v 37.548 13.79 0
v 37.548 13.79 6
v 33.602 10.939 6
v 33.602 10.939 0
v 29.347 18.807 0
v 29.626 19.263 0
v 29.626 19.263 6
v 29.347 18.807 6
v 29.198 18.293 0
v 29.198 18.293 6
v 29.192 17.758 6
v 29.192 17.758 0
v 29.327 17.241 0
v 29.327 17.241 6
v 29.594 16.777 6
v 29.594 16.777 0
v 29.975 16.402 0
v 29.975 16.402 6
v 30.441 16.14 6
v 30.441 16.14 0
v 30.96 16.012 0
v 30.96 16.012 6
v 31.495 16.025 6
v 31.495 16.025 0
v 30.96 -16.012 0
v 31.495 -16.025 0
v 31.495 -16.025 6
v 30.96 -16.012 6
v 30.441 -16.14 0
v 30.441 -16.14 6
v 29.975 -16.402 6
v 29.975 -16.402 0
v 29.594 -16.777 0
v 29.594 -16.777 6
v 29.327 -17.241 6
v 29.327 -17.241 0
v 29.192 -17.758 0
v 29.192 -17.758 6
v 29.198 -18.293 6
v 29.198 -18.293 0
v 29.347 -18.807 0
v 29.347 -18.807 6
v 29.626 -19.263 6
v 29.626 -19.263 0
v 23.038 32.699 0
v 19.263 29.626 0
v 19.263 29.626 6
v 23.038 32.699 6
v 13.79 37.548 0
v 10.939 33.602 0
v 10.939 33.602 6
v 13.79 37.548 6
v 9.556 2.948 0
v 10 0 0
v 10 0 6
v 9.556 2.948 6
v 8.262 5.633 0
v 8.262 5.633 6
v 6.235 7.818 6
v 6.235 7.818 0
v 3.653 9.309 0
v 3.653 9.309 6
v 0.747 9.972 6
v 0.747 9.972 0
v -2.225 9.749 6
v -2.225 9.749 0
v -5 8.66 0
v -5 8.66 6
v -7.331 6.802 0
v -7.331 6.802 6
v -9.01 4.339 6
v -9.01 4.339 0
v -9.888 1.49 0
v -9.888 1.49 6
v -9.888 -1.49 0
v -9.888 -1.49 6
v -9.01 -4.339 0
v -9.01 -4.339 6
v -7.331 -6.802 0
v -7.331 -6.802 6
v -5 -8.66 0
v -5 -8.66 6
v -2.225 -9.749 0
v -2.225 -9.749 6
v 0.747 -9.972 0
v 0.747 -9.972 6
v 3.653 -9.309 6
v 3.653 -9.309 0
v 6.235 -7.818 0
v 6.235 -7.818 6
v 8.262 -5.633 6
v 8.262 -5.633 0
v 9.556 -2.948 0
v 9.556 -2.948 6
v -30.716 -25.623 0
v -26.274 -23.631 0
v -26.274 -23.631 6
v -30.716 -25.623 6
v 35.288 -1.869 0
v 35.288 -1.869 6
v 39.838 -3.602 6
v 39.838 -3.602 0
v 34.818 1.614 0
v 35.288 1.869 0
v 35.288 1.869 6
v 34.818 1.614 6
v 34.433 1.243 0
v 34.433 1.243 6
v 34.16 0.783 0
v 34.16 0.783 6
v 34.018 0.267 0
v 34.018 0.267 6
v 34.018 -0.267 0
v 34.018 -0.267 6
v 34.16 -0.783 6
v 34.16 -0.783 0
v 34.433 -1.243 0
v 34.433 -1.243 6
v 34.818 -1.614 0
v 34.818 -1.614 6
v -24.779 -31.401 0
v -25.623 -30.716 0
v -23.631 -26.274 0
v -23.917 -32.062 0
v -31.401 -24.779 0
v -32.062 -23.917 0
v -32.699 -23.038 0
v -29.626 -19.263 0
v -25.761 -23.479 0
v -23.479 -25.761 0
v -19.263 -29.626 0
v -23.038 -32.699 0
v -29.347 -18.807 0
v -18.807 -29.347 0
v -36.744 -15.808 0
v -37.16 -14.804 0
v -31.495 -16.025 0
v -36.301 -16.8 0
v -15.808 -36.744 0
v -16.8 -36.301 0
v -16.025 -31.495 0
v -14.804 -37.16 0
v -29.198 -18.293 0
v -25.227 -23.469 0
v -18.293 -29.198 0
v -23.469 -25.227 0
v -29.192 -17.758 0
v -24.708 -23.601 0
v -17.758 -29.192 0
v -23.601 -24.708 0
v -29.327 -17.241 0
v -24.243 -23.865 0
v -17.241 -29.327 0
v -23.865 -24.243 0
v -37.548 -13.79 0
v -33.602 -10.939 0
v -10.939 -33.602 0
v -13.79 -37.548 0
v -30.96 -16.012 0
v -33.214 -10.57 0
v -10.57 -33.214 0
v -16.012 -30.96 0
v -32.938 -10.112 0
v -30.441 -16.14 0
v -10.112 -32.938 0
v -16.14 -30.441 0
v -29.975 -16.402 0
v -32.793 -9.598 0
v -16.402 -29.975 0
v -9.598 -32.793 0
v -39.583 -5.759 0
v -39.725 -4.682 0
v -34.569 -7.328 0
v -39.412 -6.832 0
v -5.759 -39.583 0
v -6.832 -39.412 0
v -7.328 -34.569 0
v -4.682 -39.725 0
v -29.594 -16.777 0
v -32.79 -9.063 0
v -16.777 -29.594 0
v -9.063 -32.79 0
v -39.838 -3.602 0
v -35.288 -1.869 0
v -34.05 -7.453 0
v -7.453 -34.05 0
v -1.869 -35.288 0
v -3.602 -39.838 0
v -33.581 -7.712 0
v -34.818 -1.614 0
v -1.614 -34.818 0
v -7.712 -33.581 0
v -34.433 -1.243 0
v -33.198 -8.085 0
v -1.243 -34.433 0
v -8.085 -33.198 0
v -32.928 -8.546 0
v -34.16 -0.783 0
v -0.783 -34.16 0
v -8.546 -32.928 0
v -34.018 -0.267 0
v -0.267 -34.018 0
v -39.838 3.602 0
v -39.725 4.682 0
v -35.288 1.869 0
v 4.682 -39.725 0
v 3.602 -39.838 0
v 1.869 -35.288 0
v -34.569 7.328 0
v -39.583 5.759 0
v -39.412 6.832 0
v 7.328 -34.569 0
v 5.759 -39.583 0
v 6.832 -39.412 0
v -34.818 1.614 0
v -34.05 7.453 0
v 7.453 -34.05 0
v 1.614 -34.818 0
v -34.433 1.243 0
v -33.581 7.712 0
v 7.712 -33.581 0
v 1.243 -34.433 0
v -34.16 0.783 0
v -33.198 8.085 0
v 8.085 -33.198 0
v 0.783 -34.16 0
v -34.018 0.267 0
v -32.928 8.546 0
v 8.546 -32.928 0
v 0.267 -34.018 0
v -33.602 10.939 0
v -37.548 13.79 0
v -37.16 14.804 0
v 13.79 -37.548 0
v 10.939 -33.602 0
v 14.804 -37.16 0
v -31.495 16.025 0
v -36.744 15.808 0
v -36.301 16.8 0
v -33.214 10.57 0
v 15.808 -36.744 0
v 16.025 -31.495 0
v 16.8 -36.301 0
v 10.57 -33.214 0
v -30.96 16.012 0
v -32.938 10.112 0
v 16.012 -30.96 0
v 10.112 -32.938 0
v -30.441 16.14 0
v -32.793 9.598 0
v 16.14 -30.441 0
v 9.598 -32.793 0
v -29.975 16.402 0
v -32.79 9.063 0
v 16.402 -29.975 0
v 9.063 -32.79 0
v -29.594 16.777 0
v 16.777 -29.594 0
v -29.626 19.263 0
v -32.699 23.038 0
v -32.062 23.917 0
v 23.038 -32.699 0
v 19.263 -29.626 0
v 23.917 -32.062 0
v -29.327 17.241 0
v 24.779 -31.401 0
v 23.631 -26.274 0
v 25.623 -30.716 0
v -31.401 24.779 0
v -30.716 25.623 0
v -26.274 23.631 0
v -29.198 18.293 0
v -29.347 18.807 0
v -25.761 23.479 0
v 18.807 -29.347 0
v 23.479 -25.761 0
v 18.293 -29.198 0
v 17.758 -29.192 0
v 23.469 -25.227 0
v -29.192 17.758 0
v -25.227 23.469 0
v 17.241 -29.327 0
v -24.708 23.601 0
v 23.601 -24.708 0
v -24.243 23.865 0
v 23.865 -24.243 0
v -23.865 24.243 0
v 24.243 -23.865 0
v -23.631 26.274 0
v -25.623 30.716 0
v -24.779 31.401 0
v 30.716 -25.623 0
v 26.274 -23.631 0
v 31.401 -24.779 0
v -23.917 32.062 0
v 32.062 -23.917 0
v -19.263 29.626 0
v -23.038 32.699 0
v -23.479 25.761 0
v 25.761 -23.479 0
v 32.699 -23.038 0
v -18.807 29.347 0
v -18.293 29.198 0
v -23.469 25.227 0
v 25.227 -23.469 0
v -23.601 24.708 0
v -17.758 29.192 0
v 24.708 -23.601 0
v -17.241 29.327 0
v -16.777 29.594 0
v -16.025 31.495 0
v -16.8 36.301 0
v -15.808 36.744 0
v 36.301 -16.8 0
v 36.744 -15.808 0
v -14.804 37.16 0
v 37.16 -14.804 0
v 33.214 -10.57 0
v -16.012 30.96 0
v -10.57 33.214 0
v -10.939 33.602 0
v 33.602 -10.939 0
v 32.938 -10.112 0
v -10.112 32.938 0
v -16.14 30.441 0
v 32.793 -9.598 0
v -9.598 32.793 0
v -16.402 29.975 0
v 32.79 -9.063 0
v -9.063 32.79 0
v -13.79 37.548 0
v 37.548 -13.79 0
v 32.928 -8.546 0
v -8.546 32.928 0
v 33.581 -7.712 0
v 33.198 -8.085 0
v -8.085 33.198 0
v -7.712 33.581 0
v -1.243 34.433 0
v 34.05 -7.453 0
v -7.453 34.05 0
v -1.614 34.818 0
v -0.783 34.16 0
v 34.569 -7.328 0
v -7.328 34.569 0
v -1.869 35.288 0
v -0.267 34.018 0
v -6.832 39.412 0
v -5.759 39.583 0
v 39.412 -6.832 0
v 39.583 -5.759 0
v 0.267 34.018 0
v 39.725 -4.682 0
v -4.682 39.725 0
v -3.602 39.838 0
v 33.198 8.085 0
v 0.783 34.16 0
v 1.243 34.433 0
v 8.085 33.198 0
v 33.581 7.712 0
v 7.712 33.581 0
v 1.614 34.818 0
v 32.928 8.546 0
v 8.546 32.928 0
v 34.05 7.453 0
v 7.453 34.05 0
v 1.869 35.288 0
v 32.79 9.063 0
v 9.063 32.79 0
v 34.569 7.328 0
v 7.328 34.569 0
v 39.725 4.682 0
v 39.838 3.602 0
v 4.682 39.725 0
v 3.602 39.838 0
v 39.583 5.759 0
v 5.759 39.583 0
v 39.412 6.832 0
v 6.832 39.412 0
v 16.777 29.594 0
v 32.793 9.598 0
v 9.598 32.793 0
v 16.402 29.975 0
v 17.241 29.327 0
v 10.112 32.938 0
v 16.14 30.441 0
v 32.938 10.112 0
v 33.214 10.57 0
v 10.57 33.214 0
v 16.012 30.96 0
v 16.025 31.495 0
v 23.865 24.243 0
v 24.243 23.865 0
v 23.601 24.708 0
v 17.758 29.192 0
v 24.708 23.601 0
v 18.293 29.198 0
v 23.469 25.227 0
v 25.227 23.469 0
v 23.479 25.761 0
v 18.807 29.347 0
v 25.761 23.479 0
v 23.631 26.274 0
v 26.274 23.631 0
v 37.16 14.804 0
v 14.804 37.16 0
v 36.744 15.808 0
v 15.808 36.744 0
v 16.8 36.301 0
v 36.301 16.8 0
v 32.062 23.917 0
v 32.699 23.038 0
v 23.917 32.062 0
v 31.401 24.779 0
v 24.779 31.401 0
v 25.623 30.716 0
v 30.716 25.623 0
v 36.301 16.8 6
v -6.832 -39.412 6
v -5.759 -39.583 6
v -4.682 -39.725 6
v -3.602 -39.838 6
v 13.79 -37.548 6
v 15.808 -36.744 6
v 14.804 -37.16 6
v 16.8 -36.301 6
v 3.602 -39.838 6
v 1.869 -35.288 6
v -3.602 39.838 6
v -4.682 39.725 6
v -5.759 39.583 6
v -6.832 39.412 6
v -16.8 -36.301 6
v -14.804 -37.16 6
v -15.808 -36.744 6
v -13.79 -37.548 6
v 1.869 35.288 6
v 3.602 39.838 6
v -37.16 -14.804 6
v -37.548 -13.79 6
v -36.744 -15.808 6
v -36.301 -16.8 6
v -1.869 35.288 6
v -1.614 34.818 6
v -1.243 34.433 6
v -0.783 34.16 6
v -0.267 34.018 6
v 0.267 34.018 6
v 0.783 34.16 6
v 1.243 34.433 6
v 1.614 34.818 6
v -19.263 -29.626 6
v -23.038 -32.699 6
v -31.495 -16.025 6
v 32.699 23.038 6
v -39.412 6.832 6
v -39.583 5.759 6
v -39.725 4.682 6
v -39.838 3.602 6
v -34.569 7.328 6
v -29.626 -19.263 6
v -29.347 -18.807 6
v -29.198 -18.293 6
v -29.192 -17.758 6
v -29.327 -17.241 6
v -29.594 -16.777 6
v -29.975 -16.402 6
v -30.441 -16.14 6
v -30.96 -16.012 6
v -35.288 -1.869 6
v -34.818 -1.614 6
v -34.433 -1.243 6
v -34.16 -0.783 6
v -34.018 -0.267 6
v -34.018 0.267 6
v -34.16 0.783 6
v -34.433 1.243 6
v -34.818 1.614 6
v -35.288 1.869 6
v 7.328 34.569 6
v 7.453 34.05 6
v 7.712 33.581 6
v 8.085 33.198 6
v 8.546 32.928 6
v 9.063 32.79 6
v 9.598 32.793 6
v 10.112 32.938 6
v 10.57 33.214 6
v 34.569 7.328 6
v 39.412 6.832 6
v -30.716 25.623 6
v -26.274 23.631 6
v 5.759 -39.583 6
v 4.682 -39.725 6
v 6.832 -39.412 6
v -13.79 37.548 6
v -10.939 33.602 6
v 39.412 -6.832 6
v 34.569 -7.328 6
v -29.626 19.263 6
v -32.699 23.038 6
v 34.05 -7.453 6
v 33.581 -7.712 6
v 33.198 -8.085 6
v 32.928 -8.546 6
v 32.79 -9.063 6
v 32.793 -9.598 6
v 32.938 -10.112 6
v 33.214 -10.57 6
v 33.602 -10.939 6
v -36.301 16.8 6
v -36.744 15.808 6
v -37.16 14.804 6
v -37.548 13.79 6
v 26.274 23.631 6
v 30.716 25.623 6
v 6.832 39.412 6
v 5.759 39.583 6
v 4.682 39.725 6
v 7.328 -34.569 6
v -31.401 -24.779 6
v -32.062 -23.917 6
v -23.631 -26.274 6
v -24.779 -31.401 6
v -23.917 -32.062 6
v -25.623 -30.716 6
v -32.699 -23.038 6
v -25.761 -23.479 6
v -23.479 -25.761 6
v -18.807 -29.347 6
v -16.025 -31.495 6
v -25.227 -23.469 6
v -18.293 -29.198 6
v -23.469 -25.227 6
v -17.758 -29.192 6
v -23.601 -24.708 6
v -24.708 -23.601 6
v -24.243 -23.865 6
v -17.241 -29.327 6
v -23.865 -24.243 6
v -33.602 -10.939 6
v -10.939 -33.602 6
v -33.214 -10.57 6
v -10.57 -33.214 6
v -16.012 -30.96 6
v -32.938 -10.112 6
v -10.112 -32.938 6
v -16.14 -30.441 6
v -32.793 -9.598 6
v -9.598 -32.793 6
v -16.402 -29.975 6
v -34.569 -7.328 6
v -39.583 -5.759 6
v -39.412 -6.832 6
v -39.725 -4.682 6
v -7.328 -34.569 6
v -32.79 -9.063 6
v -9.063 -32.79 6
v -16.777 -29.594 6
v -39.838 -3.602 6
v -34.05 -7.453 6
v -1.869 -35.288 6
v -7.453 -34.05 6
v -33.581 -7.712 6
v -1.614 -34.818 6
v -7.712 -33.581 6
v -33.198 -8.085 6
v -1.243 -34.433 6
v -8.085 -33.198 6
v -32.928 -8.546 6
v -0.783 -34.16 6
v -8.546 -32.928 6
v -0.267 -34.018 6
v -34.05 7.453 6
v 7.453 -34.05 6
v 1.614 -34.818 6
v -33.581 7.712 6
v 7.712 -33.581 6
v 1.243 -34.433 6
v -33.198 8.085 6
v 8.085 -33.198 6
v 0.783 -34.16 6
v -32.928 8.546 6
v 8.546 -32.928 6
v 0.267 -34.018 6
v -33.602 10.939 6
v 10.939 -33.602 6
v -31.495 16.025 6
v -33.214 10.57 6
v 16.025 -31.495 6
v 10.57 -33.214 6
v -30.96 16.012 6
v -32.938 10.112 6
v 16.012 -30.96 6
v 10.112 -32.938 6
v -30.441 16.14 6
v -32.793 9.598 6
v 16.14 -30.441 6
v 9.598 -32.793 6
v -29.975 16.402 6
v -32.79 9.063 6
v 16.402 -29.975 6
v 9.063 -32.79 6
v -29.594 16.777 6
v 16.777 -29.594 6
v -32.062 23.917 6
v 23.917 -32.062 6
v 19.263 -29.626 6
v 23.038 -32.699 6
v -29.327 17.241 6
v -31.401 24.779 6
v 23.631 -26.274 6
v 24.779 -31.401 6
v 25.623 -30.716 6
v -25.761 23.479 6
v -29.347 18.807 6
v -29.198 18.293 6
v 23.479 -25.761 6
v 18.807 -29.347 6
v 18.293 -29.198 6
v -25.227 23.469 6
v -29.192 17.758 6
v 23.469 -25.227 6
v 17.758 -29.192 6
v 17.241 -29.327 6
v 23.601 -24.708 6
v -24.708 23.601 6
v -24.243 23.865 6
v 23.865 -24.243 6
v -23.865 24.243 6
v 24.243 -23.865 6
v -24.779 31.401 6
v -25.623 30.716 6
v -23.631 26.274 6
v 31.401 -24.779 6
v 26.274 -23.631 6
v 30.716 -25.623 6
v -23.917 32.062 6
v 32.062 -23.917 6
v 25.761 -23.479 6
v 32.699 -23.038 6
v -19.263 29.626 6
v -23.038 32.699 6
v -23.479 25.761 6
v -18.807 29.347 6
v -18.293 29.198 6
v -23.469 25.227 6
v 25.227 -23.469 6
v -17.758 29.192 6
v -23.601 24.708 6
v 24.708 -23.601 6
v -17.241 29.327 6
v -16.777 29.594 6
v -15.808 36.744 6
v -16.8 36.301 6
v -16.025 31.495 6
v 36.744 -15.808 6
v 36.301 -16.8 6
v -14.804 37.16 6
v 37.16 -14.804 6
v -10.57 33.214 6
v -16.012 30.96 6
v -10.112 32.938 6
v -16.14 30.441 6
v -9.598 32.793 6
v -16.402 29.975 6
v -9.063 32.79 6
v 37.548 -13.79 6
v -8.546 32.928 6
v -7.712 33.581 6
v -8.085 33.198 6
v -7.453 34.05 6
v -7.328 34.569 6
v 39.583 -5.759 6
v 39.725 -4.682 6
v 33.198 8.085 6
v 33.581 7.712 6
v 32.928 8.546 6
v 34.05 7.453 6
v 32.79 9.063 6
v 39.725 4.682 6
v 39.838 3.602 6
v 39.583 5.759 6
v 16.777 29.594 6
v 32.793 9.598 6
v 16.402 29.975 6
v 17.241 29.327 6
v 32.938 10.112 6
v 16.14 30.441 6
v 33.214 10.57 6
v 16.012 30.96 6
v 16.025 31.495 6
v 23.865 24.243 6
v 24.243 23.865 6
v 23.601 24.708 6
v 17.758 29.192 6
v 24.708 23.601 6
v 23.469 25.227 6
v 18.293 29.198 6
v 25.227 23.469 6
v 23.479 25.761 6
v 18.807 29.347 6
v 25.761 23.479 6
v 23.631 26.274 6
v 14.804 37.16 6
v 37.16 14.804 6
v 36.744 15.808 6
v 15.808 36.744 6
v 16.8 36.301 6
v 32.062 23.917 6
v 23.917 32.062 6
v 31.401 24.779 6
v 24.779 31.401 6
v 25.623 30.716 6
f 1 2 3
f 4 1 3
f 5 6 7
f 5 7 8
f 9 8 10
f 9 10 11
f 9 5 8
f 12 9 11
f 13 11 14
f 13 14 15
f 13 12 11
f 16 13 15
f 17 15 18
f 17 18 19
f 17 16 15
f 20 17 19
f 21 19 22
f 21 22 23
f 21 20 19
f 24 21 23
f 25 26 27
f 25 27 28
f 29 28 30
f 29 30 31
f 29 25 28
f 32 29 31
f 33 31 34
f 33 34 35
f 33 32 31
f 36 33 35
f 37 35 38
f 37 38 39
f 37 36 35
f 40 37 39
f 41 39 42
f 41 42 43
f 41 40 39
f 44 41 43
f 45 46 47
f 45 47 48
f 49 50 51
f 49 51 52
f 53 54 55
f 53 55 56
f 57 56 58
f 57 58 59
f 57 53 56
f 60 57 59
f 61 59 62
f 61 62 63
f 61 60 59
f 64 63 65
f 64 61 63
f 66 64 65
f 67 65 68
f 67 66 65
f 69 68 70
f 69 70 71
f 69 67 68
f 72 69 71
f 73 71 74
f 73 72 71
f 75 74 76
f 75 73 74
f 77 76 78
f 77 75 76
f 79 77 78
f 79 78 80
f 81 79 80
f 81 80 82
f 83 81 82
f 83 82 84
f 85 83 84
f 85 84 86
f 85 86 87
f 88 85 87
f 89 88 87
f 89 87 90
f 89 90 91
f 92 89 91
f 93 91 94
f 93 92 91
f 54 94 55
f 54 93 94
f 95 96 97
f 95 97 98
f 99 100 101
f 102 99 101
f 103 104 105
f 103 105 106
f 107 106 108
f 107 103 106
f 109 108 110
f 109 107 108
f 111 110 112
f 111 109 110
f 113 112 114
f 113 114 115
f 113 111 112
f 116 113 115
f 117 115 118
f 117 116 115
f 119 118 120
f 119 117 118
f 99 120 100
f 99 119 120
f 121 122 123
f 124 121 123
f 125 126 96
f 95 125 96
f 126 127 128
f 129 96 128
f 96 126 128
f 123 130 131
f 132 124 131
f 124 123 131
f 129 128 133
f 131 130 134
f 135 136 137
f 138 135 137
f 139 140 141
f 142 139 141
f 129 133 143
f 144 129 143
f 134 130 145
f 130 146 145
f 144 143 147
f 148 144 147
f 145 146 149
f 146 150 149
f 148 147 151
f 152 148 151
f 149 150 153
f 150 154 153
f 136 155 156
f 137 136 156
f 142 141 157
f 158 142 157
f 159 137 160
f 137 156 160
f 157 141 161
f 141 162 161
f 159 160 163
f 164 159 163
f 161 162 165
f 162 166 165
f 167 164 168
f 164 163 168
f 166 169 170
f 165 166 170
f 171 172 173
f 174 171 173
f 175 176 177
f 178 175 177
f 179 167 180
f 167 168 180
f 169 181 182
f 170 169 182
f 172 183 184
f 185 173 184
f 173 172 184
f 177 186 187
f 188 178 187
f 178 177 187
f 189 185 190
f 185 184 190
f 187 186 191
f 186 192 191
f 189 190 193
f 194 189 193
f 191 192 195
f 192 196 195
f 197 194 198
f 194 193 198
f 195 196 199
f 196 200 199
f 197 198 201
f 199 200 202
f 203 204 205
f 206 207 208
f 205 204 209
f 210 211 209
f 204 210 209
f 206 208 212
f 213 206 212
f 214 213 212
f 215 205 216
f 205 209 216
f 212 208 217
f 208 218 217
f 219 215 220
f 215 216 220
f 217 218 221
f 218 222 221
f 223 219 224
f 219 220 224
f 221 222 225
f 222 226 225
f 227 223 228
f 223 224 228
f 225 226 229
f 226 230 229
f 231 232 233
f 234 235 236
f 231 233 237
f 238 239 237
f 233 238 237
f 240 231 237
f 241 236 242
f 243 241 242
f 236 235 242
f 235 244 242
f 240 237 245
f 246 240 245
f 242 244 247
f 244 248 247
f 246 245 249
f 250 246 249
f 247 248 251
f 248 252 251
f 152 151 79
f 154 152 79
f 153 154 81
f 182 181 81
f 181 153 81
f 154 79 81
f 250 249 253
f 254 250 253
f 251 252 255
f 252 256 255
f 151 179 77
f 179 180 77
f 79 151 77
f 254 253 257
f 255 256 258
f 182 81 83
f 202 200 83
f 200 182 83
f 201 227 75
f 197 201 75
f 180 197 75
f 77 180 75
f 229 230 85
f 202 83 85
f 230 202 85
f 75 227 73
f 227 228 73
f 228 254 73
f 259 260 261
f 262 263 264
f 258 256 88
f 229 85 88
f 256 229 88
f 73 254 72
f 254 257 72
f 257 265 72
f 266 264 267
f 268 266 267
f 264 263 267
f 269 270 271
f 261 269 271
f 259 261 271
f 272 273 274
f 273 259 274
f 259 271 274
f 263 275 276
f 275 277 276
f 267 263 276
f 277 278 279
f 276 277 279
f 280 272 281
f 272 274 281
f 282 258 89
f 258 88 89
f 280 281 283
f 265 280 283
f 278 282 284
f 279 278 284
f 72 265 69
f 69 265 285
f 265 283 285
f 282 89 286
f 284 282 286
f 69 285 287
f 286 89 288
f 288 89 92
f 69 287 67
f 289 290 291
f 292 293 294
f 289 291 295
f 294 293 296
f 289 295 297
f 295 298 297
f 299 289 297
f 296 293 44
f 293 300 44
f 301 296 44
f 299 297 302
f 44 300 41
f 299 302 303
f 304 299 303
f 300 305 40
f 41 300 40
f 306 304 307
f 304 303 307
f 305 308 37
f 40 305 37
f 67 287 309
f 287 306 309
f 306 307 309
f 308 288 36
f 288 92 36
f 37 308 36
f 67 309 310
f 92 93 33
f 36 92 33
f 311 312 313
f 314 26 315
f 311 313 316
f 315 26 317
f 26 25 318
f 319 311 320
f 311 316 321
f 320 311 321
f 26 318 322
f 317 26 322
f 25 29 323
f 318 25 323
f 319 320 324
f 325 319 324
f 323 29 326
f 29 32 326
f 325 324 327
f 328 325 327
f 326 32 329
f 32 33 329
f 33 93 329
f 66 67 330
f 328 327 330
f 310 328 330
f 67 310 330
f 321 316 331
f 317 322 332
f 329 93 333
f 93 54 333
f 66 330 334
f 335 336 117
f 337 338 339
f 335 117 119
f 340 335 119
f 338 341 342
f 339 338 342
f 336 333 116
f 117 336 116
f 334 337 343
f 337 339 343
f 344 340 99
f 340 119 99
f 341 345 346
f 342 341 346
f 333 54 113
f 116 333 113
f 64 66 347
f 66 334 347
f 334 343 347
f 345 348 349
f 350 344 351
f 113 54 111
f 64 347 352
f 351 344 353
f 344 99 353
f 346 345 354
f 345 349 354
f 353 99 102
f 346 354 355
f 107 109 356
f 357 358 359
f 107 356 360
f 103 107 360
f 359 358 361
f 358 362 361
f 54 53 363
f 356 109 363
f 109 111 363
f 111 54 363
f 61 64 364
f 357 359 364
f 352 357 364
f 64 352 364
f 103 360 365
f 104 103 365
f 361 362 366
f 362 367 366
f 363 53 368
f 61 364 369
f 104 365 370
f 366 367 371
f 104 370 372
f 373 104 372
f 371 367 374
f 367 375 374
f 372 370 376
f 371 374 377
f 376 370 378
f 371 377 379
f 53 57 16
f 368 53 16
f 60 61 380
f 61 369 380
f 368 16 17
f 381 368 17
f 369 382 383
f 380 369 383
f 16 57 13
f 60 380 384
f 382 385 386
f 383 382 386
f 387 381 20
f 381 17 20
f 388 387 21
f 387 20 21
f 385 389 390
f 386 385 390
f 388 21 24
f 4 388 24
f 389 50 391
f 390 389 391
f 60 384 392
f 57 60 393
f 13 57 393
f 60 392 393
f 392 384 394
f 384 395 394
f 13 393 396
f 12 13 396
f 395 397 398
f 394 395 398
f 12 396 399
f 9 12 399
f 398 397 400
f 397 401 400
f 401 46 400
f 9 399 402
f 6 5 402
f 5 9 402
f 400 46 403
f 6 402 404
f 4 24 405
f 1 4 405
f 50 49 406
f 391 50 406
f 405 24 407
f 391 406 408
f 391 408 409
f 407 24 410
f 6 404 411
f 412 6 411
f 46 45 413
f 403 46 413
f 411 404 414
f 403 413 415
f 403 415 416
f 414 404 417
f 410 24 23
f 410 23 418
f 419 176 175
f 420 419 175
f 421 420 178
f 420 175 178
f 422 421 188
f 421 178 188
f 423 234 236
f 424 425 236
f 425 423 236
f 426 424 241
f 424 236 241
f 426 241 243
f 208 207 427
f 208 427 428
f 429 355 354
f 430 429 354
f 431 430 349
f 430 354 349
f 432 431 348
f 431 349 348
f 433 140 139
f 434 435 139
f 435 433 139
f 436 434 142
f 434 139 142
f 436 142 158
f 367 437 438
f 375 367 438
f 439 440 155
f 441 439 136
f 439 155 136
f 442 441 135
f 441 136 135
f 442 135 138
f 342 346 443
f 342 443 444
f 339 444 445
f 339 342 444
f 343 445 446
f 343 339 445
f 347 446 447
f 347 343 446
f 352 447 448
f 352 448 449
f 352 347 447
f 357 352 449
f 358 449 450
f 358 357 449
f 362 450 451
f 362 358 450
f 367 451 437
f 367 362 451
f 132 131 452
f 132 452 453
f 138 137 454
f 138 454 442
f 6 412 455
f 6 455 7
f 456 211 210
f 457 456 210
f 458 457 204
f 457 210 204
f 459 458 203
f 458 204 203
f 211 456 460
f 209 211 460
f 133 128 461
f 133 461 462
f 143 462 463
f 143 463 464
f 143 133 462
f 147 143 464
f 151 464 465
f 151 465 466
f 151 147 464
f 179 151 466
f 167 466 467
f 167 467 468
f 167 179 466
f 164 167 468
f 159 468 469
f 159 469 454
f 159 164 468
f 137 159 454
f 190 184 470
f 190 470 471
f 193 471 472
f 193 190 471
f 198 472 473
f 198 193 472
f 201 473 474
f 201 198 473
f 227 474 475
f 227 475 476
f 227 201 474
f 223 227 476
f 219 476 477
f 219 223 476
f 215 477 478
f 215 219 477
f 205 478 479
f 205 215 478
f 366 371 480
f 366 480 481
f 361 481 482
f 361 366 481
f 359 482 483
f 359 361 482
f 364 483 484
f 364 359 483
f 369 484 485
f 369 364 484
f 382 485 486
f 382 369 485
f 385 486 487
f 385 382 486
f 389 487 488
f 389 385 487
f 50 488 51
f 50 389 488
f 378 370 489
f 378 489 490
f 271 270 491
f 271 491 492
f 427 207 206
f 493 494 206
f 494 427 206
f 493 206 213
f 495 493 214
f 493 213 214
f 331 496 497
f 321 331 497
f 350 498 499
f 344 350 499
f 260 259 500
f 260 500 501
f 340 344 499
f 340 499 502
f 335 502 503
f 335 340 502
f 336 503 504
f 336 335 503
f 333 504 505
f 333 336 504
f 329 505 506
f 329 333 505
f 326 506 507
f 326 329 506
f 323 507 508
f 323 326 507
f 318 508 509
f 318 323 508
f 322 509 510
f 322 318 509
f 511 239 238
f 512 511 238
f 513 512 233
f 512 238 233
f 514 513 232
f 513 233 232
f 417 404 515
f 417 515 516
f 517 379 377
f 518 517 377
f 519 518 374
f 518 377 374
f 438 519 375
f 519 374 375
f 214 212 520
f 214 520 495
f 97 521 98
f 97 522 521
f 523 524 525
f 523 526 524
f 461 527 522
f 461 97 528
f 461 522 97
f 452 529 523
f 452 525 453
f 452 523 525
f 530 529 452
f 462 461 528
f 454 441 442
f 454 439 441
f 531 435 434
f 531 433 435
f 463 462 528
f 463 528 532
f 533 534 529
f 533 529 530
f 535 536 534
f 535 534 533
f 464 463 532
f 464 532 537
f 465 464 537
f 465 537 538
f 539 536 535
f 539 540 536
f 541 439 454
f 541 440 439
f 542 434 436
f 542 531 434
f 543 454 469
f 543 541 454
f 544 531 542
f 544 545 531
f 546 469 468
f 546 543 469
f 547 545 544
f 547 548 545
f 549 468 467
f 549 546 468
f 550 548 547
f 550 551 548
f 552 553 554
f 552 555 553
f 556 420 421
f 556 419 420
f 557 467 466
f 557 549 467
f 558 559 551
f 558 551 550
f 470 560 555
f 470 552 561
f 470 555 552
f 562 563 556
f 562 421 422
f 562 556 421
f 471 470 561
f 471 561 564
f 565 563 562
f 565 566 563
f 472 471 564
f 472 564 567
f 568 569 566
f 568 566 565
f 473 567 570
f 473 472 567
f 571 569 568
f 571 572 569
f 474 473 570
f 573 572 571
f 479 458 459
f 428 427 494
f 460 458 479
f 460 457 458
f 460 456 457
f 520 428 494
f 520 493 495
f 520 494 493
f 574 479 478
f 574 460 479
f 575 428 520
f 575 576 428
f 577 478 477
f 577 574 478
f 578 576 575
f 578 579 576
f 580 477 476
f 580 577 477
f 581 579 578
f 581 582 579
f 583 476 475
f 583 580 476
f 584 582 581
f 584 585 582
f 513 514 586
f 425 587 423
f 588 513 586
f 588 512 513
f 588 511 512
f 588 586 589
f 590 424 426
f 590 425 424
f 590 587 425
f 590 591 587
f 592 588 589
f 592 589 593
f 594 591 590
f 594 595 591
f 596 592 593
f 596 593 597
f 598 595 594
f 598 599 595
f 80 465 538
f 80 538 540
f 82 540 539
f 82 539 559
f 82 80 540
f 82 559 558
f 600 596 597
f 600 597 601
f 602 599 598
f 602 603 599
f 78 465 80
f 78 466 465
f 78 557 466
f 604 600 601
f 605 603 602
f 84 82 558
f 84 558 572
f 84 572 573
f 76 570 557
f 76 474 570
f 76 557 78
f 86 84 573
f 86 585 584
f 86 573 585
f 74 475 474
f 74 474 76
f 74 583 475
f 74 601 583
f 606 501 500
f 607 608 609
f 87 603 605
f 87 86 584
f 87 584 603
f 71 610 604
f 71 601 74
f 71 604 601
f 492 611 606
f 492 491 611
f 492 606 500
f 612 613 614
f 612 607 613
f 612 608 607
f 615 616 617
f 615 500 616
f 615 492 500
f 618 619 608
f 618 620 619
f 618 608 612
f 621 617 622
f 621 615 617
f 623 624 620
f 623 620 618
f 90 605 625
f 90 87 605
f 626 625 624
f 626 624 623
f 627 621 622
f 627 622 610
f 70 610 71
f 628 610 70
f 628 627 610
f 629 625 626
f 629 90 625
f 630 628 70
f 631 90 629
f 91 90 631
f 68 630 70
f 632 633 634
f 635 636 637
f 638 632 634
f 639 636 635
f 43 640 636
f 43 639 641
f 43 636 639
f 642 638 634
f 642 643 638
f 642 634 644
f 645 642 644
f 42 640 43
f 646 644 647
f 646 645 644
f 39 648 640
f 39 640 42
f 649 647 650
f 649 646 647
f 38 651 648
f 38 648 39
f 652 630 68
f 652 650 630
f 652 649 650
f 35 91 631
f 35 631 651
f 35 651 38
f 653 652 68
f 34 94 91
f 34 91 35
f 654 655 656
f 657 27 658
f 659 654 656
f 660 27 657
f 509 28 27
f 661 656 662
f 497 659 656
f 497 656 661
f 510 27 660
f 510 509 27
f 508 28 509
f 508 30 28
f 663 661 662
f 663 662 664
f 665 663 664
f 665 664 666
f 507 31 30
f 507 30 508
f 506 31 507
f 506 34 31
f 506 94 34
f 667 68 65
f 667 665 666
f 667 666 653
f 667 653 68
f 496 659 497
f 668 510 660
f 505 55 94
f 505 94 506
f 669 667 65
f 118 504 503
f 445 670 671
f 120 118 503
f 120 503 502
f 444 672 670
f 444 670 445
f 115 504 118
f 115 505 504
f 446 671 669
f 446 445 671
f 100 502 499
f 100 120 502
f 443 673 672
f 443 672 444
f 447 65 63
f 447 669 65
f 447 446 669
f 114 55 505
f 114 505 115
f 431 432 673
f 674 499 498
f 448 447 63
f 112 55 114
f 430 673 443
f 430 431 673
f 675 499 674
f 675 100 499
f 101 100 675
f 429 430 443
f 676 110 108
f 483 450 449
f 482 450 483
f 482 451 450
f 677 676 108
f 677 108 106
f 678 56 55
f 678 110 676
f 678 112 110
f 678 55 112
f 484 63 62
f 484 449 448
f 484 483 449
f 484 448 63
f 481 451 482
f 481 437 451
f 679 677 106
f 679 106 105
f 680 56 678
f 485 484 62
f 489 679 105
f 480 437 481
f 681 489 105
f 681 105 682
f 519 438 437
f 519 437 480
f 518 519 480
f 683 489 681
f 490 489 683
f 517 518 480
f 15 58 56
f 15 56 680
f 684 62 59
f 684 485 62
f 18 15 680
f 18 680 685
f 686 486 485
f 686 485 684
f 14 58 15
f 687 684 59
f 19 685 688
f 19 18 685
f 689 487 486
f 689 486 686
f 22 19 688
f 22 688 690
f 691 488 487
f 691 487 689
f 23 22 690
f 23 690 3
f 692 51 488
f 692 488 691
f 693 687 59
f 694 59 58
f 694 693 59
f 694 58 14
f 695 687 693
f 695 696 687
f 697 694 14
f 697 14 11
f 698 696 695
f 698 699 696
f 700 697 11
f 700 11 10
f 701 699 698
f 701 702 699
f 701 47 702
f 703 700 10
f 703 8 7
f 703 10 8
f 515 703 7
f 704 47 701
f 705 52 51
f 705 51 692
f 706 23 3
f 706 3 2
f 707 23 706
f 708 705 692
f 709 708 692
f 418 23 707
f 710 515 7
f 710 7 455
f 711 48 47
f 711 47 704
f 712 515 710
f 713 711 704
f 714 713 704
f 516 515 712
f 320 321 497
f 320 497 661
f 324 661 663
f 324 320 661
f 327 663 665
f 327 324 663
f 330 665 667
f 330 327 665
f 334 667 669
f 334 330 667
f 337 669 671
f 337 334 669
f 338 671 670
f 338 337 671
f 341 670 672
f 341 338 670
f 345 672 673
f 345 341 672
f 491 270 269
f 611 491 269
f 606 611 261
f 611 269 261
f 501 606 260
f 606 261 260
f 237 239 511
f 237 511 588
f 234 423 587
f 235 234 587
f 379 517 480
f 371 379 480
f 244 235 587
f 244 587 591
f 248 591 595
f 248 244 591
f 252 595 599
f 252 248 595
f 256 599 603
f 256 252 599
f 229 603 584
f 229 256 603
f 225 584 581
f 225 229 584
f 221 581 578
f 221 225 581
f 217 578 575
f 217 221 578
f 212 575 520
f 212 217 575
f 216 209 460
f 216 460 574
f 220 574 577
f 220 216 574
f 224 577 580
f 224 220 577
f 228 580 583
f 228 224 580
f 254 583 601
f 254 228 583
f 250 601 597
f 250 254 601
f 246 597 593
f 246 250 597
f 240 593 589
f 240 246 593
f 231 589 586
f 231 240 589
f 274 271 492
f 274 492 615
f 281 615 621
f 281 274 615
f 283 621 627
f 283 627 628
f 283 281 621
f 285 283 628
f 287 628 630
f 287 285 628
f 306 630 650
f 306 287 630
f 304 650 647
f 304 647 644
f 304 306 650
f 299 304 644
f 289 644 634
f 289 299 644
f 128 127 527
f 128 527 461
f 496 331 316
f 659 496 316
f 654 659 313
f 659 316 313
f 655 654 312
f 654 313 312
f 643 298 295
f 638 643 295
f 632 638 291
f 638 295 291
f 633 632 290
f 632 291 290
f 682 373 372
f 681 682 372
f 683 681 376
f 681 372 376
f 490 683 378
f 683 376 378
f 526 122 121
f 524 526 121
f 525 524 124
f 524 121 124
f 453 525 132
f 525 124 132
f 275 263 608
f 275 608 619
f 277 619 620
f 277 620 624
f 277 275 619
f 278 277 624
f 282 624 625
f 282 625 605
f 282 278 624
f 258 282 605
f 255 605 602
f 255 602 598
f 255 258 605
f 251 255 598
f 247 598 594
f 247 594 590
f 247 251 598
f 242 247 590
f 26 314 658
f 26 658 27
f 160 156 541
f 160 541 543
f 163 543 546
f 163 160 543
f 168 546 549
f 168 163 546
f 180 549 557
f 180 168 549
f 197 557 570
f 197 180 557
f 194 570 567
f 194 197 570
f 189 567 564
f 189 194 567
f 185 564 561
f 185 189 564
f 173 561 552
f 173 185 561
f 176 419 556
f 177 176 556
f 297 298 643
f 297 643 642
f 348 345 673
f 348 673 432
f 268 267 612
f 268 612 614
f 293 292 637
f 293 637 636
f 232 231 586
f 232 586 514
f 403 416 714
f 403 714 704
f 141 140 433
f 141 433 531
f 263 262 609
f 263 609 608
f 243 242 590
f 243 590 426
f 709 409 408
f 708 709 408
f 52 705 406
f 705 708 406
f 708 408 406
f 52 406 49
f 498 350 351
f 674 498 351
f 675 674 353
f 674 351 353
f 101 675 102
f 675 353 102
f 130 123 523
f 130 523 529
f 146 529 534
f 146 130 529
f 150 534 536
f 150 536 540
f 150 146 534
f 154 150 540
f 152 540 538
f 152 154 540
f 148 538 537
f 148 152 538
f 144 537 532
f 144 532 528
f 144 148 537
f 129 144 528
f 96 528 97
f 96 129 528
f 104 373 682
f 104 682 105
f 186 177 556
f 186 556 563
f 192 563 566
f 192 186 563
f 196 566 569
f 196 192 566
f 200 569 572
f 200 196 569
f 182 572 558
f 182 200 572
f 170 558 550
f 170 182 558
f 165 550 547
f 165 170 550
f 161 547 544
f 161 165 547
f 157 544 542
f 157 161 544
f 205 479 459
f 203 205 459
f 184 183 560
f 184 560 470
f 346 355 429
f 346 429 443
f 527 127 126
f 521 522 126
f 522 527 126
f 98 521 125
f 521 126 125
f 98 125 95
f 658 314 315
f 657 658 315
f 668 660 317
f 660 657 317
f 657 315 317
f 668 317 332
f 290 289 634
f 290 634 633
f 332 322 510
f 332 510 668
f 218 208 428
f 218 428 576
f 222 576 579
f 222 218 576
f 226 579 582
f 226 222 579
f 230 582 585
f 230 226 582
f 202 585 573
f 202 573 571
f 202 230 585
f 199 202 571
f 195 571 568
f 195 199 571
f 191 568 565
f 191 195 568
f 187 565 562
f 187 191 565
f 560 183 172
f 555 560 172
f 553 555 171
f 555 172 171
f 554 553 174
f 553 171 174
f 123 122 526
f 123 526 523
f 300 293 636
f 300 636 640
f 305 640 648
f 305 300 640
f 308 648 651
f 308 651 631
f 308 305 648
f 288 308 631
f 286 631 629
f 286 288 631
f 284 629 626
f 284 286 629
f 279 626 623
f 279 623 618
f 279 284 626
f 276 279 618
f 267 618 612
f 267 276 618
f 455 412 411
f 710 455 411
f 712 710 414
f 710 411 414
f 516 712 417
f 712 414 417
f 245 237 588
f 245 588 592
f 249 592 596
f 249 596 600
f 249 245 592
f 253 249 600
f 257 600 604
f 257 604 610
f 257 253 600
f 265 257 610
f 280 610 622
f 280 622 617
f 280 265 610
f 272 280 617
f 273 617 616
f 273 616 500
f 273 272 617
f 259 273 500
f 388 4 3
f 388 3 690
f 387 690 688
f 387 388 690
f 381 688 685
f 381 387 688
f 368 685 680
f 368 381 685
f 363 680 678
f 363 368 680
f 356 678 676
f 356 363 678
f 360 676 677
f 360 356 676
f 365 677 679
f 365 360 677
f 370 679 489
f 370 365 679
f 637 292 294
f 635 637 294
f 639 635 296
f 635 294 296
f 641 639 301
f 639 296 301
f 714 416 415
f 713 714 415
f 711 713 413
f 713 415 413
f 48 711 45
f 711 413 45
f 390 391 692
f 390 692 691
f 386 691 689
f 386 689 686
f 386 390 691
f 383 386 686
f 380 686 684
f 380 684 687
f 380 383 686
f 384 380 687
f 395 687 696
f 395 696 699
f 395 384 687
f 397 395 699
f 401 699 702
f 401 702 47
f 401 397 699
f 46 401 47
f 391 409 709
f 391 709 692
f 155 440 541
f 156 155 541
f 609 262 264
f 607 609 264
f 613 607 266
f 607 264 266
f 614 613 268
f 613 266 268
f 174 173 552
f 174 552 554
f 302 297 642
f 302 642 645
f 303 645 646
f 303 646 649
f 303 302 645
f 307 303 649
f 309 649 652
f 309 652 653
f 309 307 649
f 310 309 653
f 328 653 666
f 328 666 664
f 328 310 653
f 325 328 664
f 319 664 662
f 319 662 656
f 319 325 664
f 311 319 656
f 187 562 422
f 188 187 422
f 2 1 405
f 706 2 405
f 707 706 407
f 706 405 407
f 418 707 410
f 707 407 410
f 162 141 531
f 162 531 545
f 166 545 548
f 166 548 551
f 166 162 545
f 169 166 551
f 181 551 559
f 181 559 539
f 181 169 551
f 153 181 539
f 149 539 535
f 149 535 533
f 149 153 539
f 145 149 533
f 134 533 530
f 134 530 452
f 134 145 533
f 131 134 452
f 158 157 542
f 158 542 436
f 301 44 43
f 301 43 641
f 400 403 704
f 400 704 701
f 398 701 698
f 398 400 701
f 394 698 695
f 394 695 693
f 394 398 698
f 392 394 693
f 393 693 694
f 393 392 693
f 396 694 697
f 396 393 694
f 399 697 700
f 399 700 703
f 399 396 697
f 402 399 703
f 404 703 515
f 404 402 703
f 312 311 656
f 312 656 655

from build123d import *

# Parameters (mm, degrees)
SKETCH1_R           = 40
SKETCH1_R_2         = 10
BOSS_EXTRUDE1_DEPTH = 6
CUT_EXTRUDE1_START  = -6
CUT_EXTRUDE1_DEPTH  = 6
CIRPATTERN1_DEPTH   = 6


# Read off the part's stored shape, not the designer's step: CirPattern1
with BuildPart() as part:
    # Sketch1 → Boss-Extrude1 (new body)
    with BuildSketch(Plane.XY):
        Circle(SKETCH1_R)
        Circle(SKETCH1_R_2, mode=Mode.SUBTRACT)
    extrude(amount=BOSS_EXTRUDE1_DEPTH)

    # Sketch2 → Cut-Extrude1 (cut)
    with BuildSketch(Plane.XY.offset(6).offset(CUT_EXTRUDE1_START)):
        with BuildLine():
            Line((-3.601715358, 39.837515566), (-1.869030862, 35.288154767))
            ThreePointArc((-1.869030862, 35.288154767), (0, 34), (1.869030862, 35.288154767))
            Line((1.869030862, 35.288154767), (3.601715358, 39.837515566))
            ThreePointArc((3.601715358, 39.837515566), (0, 40), (-3.601715358, 39.837515566))
        make_face()
    extrude(amount=CUT_EXTRUDE1_DEPTH, mode=Mode.SUBTRACT)

    # CirPattern1 outline → CirPattern1 (cut)
    with BuildSketch(Plane.XY):
        with BuildLine():
            Line((-13.789697621, 37.547892611), (-10.9385917, 33.601999269))
            ThreePointArc((-10.9385917, 33.601999269), (-8.799847533, 32.841478094), (-7.32790134, 34.569480835))
            Line((-7.32790134, 34.569480835), (-6.831717855, 39.41227767))
            ThreePointArc((-6.831717855, 39.41227767), (-10.352761804, 38.637033051), (-13.789697621, 37.547892611))
        make_face()
        with BuildLine():
            Line((10.9385917, 33.601999269), (13.789697621, 37.547892611))
            ThreePointArc((13.789697621, 37.547892611), (10.352761804, 38.637033051), (6.831717855, 39.41227767))
            Line((6.831717855, 39.41227767), (7.32790134, 34.569480835))
            ThreePointArc((7.32790134, 34.569480835), (8.799847533, 32.841478094), (10.9385917, 33.601999269))
        make_face()
        with BuildLine():
            Line((19.262705591, 29.62592305), (23.03793478, 32.699442825))
            ThreePointArc((23.03793478, 32.699442825), (20, 34.641016151), (16.799580786, 36.301158183))
            Line((16.799580786, 36.301158183), (16.025449176, 31.494953912))
            ThreePointArc((16.025449176, 31.494953912), (17, 29.444863729), (19.262705591, 29.62592305))
        make_face()
        with BuildLine():
            Line((26.274097929, 23.630889134), (30.716174756, 25.622580049))
            ThreePointArc((30.716174756, 25.622580049), (28.284271247, 28.284271247), (25.622580049, 30.716174756))
            Line((25.622580049, 30.716174756), (23.630889134, 26.274097929))
            ThreePointArc((23.630889134, 26.274097929), (24.04163056, 24.04163056), (26.274097929, 23.630889134))
        make_face()
        with BuildLine():
            Line((31.494953912, 16.025449176), (36.301158183, 16.799580786))
            ThreePointArc((36.301158183, 16.799580786), (34.641016151, 20), (32.699442825, 23.03793478))
            Line((32.699442825, 23.03793478), (29.62592305, 19.262705591))
            ThreePointArc((29.62592305, 19.262705591), (29.444863729, 17), (31.494953912, 16.025449176))
        make_face()
        with BuildLine():
            Line((34.569480835, 7.32790134), (39.41227767, 6.831717855))
            ThreePointArc((39.41227767, 6.831717855), (38.637033052, 10.352761804), (37.547892611, 13.789697621))
            Line((37.547892611, 13.789697621), (33.601999269, 10.9385917))
            ThreePointArc((33.601999269, 10.9385917), (32.841478094, 8.799847533), (34.569480835, 7.32790134))
        make_face()
        with BuildLine():
            Line((35.288154767, -1.869030862), (39.837515566, -3.601715358))
            ThreePointArc((39.837515566, -3.601715358), (40, 0), (39.837515566, 3.601715358))
            Line((39.837515566, 3.601715358), (35.288154767, 1.869030862))
            ThreePointArc((35.288154767, 1.869030862), (34, 0), (35.288154767, -1.869030862))
        make_face()
        with BuildLine():
            Line((33.601999269, -10.9385917), (37.547892611, -13.789697621))
            ThreePointArc((37.547892611, -13.789697621), (38.637033052, -10.352761804), (39.41227767, -6.831717855))
            Line((39.41227767, -6.831717855), (34.569480835, -7.32790134))
            ThreePointArc((34.569480835, -7.32790134), (32.841478094, -8.799847533), (33.601999269, -10.9385917))
        make_face()
        with BuildLine():
            Line((29.62592305, -19.262705591), (32.699442825, -23.03793478))
            ThreePointArc((32.699442825, -23.03793478), (34.641016151, -20), (36.301158183, -16.799580786))
            Line((36.301158183, -16.799580786), (31.494953912, -16.025449176))
            ThreePointArc((31.494953912, -16.025449176), (29.444863729, -17), (29.62592305, -19.262705591))
        make_face()
        with BuildLine():
            Line((23.630889134, -26.274097929), (25.622580049, -30.716174756))
            ThreePointArc((25.622580049, -30.716174756), (28.284271247, -28.284271247), (30.716174756, -25.622580049))
            Line((30.716174756, -25.622580049), (26.274097929, -23.630889134))
            ThreePointArc((26.274097929, -23.630889134), (24.04163056, -24.04163056), (23.630889134, -26.274097929))
        make_face()
        with BuildLine():
            Line((16.025449176, -31.494953912), (16.799580786, -36.301158183))
            ThreePointArc((16.799580786, -36.301158183), (20, -34.641016151), (23.03793478, -32.699442825))
            Line((23.03793478, -32.699442825), (19.262705591, -29.62592305))
            ThreePointArc((19.262705591, -29.62592305), (17, -29.444863729), (16.025449176, -31.494953912))
        make_face()
        with BuildLine():
            Line((7.32790134, -34.569480835), (6.831717855, -39.41227767))
            ThreePointArc((6.831717855, -39.41227767), (10.352761804, -38.637033052), (13.789697621, -37.547892611))
            Line((13.789697621, -37.547892611), (10.9385917, -33.601999269))
            ThreePointArc((10.9385917, -33.601999269), (8.799847533, -32.841478094), (7.32790134, -34.569480835))
        make_face()
        with BuildLine():
            Line((-1.869030862, -35.288154767), (-3.601715358, -39.837515566))
            ThreePointArc((-3.601715358, -39.837515566), (0, -40), (3.601715358, -39.837515566))
            Line((3.601715358, -39.837515566), (1.869030862, -35.288154767))
            ThreePointArc((1.869030862, -35.288154767), (0, -34), (-1.869030862, -35.288154767))
        make_face()
        with BuildLine():
            Line((-10.9385917, -33.601999269), (-13.789697621, -37.547892611))
            ThreePointArc((-13.789697621, -37.547892611), (-10.352761804, -38.637033052), (-6.831717855, -39.41227767))
            Line((-6.831717855, -39.41227767), (-7.32790134, -34.569480835))
            ThreePointArc((-7.32790134, -34.569480835), (-8.799847533, -32.841478094), (-10.9385917, -33.601999269))
        make_face()
        with BuildLine():
            Line((-19.262705591, -29.62592305), (-23.03793478, -32.699442825))
            ThreePointArc((-23.03793478, -32.699442825), (-20, -34.641016151), (-16.799580786, -36.301158183))
            Line((-16.799580786, -36.301158183), (-16.025449176, -31.494953912))
            ThreePointArc((-16.025449176, -31.494953912), (-17, -29.444863729), (-19.262705591, -29.62592305))
        make_face()
        with BuildLine():
            Line((-26.274097929, -23.630889134), (-30.716174756, -25.622580049))
            ThreePointArc((-30.716174756, -25.622580049), (-28.284271247, -28.284271247), (-25.622580049, -30.716174756))
            Line((-25.622580049, -30.716174756), (-23.630889134, -26.274097929))
            ThreePointArc((-23.630889134, -26.274097929), (-24.04163056, -24.04163056), (-26.274097929, -23.630889134))
        make_face()
        with BuildLine():
            Line((-31.494953912, -16.025449176), (-36.301158183, -16.799580786))
            ThreePointArc((-36.301158183, -16.799580786), (-34.641016151, -20), (-32.699442825, -23.03793478))
            Line((-32.699442825, -23.03793478), (-29.62592305, -19.262705591))
            ThreePointArc((-29.62592305, -19.262705591), (-29.444863729, -17), (-31.494953912, -16.025449176))
        make_face()
        with BuildLine():
            Line((-34.569480835, -7.32790134), (-39.41227767, -6.831717855))
            ThreePointArc((-39.41227767, -6.831717855), (-38.637033052, -10.352761804), (-37.547892611, -13.789697621))
            Line((-37.547892611, -13.789697621), (-33.601999269, -10.9385917))
            ThreePointArc((-33.601999269, -10.9385917), (-32.841478094, -8.799847533), (-34.569480835, -7.32790134))
        make_face()
        with BuildLine():
            Line((-35.288154767, 1.869030862), (-39.837515566, 3.601715358))
            ThreePointArc((-39.837515566, 3.601715358), (-40, 0), (-39.837515566, -3.601715358))
            Line((-39.837515566, -3.601715358), (-35.288154767, -1.869030862))
            ThreePointArc((-35.288154767, -1.869030862), (-34, 0), (-35.288154767, 1.869030862))
        make_face()
        with BuildLine():
            Line((-33.601999269, 10.9385917), (-37.547892611, 13.789697621))
            ThreePointArc((-37.547892611, 13.789697621), (-38.637033052, 10.352761804), (-39.41227767, 6.831717855))
            Line((-39.41227767, 6.831717855), (-34.569480835, 7.32790134))
            ThreePointArc((-34.569480835, 7.32790134), (-32.841478094, 8.799847533), (-33.601999269, 10.9385917))
        make_face()
        with BuildLine():
            Line((-29.62592305, 19.262705591), (-32.699442825, 23.03793478))
            ThreePointArc((-32.699442825, 23.03793478), (-34.641016151, 20), (-36.301158183, 16.799580786))
            Line((-36.301158183, 16.799580786), (-31.494953912, 16.025449176))
            ThreePointArc((-31.494953912, 16.025449176), (-29.444863729, 17), (-29.62592305, 19.262705591))
        make_face()
        with BuildLine():
            Line((-23.630889134, 26.274097929), (-25.622580049, 30.716174756))
            ThreePointArc((-25.622580049, 30.716174756), (-28.284271247, 28.284271247), (-30.716174756, 25.622580049))
            Line((-30.716174756, 25.622580049), (-26.274097929, 23.630889134))
            ThreePointArc((-26.274097929, 23.630889134), (-24.04163056, 24.04163056), (-23.630889134, 26.274097929))
        make_face()
        with BuildLine():
            Line((-16.025449176, 31.494953912), (-16.799580786, 36.301158183))
            ThreePointArc((-16.799580786, 36.301158183), (-20, 34.641016151), (-23.03793478, 32.699442825))
            Line((-23.03793478, 32.699442825), (-19.262705591, 29.62592305))
            ThreePointArc((-19.262705591, 29.62592305), (-17, 29.444863729), (-16.025449176, 31.494953912))
        make_face()
    extrude(amount=CIRPATTERN1_DEPTH, mode=Mode.SUBTRACT)


solid = part.part
